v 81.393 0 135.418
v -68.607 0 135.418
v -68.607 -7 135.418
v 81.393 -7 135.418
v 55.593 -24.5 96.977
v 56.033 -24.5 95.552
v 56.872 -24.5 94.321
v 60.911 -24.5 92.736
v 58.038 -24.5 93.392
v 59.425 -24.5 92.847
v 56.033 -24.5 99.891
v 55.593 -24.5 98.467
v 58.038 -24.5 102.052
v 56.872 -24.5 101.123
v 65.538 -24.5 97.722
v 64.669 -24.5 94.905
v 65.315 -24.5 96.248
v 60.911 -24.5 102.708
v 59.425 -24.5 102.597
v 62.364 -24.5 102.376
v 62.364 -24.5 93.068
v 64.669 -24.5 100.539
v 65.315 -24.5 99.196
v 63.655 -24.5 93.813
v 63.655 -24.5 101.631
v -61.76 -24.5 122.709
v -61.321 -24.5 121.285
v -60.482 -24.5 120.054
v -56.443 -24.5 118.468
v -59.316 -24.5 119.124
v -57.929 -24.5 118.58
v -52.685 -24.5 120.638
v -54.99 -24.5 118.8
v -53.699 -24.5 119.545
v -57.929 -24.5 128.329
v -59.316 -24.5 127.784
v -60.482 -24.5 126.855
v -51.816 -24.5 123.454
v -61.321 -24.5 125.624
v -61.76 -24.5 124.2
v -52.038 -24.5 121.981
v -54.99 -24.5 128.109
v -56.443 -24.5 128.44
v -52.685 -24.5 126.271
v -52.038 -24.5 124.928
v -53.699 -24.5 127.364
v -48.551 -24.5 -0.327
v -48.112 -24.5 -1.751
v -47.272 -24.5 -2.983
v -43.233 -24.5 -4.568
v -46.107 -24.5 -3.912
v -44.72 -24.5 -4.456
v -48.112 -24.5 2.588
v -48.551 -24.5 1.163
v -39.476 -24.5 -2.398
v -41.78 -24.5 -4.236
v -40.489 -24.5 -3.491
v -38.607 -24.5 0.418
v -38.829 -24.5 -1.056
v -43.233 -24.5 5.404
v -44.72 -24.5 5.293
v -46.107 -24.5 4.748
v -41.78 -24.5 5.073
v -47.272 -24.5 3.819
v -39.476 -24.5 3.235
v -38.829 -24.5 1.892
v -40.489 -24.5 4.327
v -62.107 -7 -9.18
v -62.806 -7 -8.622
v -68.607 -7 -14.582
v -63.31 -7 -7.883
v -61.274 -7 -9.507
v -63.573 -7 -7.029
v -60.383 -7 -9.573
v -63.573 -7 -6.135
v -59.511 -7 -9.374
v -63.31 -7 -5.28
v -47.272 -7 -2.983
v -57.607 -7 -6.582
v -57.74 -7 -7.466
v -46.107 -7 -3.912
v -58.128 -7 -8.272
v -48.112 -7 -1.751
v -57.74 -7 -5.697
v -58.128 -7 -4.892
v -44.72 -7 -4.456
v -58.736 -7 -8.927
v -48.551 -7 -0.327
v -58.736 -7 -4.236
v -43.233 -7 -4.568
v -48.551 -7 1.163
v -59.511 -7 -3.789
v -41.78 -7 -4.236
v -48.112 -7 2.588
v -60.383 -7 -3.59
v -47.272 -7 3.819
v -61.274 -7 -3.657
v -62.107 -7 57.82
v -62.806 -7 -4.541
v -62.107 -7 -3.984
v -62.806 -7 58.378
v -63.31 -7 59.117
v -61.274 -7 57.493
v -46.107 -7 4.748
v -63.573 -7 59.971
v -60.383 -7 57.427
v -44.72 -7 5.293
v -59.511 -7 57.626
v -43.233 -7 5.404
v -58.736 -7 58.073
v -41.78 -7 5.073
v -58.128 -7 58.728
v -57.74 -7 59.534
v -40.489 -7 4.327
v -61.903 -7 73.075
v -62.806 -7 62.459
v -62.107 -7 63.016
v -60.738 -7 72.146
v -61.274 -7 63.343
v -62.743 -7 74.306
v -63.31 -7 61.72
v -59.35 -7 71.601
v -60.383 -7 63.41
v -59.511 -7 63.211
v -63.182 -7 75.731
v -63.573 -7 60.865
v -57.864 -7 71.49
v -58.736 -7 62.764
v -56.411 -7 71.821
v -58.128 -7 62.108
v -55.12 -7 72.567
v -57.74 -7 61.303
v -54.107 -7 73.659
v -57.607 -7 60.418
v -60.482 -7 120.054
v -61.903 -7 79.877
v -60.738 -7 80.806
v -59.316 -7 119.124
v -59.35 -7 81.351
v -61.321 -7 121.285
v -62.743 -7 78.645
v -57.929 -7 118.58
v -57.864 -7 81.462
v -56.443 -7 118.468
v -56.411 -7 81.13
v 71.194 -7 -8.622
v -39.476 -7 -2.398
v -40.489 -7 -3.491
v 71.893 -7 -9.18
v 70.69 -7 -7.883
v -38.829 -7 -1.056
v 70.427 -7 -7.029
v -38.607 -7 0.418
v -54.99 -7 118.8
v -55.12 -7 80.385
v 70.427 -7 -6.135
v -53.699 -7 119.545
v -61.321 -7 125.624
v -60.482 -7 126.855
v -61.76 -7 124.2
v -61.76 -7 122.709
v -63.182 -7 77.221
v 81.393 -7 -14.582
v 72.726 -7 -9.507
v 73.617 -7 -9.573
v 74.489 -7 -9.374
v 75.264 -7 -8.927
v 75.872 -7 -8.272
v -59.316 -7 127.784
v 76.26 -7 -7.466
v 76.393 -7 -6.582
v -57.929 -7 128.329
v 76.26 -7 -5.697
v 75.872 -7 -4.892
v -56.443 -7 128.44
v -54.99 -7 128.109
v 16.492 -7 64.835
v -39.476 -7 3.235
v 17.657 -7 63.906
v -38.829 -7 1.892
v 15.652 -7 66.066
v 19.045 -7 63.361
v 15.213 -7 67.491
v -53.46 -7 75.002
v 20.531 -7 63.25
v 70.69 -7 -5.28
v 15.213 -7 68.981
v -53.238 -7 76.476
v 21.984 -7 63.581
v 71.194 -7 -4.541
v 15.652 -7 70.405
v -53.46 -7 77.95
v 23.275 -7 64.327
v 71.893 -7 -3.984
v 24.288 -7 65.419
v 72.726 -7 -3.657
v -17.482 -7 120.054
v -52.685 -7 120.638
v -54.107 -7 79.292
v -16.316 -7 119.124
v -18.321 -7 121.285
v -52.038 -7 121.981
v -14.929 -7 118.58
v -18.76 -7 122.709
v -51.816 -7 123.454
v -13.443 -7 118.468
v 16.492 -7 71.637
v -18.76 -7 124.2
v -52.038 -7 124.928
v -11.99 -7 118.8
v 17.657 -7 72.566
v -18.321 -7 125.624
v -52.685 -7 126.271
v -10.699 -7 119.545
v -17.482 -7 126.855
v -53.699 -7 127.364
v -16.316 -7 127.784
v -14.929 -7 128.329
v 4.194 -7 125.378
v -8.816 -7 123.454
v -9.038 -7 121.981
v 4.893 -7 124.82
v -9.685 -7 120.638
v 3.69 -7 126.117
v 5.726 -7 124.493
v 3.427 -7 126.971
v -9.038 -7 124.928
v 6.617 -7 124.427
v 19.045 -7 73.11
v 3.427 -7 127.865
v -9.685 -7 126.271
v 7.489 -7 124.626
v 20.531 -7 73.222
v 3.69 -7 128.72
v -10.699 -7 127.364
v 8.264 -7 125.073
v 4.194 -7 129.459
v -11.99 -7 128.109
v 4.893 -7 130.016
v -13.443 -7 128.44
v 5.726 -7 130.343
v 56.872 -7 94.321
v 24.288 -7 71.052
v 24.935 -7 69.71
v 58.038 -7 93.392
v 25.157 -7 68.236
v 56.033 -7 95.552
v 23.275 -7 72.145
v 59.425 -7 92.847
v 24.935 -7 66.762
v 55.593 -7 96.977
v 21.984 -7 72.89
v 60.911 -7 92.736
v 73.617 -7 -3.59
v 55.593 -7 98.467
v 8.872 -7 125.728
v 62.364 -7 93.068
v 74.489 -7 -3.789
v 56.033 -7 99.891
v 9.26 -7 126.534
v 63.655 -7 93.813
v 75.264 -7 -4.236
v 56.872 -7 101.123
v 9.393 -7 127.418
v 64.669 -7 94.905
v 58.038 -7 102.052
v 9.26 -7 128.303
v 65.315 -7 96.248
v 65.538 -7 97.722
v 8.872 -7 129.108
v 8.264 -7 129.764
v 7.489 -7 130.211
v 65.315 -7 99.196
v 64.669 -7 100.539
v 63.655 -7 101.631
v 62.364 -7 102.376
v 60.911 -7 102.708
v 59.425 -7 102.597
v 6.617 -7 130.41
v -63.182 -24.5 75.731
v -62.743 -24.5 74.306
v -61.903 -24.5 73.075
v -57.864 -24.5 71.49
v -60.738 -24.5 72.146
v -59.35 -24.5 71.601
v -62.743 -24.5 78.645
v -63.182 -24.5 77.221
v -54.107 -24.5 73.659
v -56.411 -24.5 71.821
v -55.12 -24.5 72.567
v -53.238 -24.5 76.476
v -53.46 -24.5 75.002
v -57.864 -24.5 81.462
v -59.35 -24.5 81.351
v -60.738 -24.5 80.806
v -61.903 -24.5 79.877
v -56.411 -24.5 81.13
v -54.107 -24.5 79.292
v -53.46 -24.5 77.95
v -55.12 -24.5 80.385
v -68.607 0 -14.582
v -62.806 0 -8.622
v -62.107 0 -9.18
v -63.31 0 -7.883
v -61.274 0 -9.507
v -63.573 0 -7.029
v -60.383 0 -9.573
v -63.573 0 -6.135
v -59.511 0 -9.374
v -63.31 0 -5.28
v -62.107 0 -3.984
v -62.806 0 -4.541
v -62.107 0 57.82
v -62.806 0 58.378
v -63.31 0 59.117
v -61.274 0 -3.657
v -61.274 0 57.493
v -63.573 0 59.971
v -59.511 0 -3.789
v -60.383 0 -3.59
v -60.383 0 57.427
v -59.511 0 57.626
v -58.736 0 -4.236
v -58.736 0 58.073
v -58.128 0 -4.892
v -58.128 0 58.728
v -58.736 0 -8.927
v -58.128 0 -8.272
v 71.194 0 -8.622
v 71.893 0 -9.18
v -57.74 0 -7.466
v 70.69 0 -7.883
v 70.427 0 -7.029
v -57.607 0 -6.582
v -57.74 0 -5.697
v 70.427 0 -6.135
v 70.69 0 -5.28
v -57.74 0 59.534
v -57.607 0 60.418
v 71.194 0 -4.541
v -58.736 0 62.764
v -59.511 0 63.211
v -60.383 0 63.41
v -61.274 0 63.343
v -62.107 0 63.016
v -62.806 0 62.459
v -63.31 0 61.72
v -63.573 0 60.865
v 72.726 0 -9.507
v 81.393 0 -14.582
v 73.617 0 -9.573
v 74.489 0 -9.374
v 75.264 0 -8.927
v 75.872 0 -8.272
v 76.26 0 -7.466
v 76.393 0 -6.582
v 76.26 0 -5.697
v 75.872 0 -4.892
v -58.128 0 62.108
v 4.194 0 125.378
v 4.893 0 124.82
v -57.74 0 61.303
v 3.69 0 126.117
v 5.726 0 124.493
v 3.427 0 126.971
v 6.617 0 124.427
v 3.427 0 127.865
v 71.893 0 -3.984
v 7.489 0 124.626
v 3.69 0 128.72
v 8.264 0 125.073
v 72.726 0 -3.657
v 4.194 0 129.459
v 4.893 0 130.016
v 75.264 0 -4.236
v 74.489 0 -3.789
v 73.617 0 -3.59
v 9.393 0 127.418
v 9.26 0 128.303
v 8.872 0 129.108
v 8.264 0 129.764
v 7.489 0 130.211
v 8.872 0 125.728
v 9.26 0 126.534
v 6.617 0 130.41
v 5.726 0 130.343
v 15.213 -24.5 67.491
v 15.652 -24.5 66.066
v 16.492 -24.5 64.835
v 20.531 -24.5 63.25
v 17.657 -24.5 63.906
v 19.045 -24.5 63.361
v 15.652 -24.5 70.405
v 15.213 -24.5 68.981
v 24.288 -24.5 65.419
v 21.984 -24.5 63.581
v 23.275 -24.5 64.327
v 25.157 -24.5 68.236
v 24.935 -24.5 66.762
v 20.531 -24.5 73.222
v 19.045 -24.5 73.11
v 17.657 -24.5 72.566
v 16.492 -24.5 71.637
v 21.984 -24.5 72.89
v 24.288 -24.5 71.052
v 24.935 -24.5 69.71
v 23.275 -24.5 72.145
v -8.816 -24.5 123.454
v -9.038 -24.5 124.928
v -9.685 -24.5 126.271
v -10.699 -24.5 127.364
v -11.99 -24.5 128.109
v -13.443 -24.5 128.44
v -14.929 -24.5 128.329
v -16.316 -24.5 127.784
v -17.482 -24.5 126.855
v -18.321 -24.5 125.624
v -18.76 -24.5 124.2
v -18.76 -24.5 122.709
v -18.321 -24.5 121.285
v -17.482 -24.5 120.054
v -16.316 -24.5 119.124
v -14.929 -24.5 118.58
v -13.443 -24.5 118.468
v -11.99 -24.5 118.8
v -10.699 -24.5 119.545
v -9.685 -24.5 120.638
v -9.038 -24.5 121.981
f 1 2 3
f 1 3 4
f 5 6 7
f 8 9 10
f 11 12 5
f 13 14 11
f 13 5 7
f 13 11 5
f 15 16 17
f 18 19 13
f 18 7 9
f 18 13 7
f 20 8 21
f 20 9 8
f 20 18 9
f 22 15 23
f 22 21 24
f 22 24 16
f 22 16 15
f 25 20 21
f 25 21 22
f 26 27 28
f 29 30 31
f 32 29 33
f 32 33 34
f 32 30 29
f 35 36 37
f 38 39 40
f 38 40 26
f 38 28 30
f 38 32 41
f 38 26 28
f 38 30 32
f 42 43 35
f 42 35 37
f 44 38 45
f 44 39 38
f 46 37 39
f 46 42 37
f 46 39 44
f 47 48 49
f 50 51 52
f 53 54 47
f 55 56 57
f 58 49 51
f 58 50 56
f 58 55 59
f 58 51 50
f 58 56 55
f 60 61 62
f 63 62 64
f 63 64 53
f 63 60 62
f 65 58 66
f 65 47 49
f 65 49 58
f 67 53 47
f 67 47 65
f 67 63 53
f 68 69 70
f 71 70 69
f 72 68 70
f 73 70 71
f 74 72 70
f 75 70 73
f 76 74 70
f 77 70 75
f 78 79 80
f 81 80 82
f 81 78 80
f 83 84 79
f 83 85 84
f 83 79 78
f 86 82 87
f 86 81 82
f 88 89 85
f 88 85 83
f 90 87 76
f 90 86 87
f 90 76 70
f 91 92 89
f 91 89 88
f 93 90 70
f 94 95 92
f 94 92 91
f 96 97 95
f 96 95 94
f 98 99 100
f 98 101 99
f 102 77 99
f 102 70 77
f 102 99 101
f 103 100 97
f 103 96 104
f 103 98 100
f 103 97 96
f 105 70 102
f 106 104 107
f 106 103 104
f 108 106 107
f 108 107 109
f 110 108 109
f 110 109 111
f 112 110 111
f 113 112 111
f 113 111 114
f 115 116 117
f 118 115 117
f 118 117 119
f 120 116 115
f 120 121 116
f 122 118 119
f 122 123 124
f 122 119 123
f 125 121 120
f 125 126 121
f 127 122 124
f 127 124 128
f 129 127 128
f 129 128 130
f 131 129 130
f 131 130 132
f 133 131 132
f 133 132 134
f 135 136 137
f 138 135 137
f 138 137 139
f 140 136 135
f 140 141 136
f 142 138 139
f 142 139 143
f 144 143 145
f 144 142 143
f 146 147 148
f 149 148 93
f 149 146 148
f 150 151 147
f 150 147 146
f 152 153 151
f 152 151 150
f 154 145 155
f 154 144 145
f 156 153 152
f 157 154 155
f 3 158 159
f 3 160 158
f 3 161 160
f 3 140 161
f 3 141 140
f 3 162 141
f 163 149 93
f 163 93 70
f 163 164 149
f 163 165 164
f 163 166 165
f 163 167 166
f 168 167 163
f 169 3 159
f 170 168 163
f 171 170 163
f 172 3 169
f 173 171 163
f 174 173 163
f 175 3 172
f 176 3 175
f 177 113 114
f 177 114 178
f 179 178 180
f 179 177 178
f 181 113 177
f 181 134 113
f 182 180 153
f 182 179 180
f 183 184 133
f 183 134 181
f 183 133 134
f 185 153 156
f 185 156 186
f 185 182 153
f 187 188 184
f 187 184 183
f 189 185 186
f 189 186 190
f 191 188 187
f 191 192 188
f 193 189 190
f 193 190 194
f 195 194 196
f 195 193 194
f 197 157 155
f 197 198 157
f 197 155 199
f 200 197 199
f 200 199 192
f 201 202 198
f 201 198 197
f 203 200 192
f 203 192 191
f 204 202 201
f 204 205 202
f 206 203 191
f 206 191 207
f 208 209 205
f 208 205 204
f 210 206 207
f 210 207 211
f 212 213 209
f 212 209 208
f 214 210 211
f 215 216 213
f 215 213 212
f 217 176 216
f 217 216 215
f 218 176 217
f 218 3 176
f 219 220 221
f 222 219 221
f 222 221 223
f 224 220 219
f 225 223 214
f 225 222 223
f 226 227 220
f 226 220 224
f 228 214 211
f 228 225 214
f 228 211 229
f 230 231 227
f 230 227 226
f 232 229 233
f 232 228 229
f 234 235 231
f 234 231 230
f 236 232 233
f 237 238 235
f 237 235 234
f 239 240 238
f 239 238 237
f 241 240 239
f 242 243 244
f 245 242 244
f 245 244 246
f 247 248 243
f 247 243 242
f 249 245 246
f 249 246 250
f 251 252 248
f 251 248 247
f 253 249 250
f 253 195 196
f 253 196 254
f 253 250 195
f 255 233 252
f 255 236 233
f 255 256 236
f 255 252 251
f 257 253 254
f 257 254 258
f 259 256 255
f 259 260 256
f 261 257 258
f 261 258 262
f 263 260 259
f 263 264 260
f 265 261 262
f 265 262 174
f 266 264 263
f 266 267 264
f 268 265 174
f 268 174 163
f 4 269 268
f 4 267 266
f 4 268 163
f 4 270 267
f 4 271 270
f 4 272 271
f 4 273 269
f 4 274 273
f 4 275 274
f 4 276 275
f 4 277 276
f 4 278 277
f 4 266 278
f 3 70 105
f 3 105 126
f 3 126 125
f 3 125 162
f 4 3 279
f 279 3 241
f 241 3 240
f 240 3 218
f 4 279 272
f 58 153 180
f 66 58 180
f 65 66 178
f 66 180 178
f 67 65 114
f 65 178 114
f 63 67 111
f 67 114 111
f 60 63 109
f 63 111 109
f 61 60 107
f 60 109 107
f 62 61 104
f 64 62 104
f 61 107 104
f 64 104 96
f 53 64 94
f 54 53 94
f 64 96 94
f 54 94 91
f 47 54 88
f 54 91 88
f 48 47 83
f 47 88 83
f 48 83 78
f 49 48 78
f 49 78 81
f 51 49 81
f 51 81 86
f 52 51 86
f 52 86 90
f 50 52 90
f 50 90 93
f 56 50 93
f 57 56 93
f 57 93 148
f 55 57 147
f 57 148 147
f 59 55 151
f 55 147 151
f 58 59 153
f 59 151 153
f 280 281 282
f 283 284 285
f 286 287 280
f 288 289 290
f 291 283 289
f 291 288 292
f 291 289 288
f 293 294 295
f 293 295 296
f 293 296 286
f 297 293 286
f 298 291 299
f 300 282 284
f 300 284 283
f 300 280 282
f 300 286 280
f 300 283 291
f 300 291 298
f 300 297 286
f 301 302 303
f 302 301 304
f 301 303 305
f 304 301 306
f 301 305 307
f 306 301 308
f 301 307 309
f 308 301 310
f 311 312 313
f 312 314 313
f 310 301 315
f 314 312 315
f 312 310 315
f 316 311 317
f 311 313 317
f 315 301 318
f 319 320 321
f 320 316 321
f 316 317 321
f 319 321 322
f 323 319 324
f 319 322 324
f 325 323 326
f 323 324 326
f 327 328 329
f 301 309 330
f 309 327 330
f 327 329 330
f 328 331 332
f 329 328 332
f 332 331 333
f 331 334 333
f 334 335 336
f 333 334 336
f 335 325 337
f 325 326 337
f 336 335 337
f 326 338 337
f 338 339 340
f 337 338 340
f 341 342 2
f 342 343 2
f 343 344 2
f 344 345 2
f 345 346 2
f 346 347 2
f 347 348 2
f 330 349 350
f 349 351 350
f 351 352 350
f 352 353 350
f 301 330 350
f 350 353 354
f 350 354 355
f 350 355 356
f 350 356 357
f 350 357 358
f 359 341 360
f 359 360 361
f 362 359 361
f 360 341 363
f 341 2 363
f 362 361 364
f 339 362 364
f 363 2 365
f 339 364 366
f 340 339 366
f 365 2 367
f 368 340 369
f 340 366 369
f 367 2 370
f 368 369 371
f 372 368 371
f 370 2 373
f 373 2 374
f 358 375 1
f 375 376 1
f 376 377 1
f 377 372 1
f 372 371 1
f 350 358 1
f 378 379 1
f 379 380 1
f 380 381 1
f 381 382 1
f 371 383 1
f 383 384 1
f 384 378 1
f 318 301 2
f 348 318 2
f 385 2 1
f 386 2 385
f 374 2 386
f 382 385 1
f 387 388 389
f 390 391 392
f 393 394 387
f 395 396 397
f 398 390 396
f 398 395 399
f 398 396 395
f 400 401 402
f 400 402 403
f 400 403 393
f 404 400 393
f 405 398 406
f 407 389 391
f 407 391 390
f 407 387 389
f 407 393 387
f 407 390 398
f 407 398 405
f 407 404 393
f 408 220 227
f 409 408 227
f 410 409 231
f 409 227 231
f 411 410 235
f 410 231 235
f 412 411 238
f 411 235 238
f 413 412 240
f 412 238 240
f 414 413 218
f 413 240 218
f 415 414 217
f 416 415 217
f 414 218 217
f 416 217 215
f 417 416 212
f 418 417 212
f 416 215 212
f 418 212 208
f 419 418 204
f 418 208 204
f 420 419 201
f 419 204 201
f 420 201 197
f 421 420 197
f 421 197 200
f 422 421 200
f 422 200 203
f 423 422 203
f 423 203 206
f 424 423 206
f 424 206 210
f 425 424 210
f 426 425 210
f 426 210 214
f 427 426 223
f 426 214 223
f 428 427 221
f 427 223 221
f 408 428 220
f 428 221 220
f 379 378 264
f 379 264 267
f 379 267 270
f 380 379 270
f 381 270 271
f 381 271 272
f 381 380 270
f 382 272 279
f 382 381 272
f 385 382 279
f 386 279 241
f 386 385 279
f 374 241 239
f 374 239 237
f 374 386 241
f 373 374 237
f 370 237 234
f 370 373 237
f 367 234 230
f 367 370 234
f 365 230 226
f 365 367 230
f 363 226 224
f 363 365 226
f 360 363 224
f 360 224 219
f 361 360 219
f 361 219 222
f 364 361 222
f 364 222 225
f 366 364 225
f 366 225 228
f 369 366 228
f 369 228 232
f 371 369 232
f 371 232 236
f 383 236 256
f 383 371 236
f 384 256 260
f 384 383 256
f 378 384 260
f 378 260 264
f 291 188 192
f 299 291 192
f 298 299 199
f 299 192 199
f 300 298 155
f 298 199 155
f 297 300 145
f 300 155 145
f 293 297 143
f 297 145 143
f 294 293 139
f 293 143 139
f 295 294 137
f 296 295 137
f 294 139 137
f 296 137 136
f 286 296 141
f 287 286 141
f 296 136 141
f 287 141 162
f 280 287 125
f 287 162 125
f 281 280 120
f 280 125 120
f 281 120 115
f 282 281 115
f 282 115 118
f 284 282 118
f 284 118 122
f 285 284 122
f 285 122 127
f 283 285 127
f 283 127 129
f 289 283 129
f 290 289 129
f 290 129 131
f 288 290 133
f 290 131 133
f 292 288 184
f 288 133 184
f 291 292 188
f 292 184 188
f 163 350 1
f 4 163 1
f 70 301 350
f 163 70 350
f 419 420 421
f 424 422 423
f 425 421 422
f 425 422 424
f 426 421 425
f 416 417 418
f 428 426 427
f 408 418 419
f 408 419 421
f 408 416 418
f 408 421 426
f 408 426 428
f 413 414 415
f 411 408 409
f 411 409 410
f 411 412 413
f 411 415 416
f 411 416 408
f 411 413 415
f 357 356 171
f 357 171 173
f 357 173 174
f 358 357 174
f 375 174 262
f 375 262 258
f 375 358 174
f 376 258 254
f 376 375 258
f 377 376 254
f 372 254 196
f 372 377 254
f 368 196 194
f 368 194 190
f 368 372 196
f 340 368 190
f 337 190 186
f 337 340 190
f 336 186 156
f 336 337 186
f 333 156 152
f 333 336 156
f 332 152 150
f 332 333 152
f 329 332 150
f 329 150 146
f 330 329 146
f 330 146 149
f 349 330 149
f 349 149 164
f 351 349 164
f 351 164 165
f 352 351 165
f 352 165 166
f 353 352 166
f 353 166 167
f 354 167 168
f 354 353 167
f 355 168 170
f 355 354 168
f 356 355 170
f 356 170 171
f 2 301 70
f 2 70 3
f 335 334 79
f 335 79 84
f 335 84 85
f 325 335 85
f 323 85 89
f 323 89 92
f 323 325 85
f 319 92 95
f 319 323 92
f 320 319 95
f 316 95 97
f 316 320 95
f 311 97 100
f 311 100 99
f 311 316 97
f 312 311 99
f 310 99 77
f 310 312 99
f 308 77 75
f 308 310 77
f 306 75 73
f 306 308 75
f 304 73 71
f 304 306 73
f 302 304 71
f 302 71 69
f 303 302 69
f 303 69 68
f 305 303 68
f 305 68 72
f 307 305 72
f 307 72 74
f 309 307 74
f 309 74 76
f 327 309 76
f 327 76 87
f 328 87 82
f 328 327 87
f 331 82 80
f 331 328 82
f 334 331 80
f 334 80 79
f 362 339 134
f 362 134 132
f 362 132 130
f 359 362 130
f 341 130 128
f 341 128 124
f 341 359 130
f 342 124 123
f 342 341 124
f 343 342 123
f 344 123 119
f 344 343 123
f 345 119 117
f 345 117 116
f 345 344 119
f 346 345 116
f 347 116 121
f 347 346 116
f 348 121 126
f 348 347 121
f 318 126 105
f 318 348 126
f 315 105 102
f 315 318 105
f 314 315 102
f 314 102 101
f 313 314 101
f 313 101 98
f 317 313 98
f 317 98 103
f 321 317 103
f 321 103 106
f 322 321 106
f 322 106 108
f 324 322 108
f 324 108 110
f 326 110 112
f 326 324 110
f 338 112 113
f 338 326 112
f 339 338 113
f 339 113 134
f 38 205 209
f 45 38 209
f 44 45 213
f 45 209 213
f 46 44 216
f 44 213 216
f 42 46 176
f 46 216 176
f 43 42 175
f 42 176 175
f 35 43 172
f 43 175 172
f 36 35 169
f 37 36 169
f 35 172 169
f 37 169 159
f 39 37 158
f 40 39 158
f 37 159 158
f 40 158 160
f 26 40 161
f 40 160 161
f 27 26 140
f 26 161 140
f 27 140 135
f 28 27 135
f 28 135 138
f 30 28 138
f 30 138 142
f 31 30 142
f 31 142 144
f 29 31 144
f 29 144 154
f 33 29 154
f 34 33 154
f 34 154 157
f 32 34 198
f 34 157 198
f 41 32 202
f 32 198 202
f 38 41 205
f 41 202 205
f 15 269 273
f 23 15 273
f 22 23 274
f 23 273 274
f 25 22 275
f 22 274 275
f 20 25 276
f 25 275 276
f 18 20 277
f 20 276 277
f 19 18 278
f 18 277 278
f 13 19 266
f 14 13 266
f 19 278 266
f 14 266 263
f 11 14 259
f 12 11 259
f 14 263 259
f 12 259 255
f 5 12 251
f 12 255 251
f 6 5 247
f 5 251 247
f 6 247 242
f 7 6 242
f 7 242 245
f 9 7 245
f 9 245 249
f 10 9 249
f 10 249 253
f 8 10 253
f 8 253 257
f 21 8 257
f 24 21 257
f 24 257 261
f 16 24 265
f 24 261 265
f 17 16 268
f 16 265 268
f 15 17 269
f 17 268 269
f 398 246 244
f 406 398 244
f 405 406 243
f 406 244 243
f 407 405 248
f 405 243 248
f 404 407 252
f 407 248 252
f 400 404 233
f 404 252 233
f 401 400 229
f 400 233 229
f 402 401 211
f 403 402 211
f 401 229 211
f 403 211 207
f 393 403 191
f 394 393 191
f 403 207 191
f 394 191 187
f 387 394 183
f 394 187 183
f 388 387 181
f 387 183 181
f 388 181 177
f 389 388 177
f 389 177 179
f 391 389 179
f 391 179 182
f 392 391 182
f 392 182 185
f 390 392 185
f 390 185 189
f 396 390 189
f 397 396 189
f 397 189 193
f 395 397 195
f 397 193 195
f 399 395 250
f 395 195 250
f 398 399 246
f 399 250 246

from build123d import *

# Parameters (mm, degrees)
F0_W     = 150
F0_H     = 150
F0_R     = 3
F1_DEPTH = 7
F2_R     = 5
F3_DEPTH = 17.5


with BuildPart() as f1:
    # F0 (on Front) → F1 (new body)
    with BuildSketch(Plane.XZ):
        with Locations((6.393103, 60.418246)):
            Rectangle(F0_W, F0_H)
        with Locations((-60.606897, -6.581754)):
            Circle(F0_R, mode=Mode.SUBTRACT)
        with Locations((73.393103, -6.581754)):
            Circle(F0_R, mode=Mode.SUBTRACT)
        with Locations((-60.606897, 60.418246)):
            Circle(F0_R, mode=Mode.SUBTRACT)
        with Locations((6.393103, 127.418246)):
            Circle(F0_R, mode=Mode.SUBTRACT)
    extrude(amount=F1_DEPTH)

    # F2 (on face) → F3 (join)
    with BuildSketch(Plane.XZ.offset(7)):
        with Locations((-56.816334, 123.454368)):
            Circle(F2_R)
        with Locations((-13.816334, 123.454368)):
            Circle(F2_R)
        with Locations((-58.237764, 76.475867)):
            Circle(F2_R)
        with Locations((-43.606897, 0.418246)):
            Circle(F2_R)
        with Locations((20.157204, 68.235859)):
            Circle(F2_R)
        with Locations((60.537563, 97.721901)):
            Circle(F2_R)
    extrude(amount=F3_DEPTH)


solid = f1.part
